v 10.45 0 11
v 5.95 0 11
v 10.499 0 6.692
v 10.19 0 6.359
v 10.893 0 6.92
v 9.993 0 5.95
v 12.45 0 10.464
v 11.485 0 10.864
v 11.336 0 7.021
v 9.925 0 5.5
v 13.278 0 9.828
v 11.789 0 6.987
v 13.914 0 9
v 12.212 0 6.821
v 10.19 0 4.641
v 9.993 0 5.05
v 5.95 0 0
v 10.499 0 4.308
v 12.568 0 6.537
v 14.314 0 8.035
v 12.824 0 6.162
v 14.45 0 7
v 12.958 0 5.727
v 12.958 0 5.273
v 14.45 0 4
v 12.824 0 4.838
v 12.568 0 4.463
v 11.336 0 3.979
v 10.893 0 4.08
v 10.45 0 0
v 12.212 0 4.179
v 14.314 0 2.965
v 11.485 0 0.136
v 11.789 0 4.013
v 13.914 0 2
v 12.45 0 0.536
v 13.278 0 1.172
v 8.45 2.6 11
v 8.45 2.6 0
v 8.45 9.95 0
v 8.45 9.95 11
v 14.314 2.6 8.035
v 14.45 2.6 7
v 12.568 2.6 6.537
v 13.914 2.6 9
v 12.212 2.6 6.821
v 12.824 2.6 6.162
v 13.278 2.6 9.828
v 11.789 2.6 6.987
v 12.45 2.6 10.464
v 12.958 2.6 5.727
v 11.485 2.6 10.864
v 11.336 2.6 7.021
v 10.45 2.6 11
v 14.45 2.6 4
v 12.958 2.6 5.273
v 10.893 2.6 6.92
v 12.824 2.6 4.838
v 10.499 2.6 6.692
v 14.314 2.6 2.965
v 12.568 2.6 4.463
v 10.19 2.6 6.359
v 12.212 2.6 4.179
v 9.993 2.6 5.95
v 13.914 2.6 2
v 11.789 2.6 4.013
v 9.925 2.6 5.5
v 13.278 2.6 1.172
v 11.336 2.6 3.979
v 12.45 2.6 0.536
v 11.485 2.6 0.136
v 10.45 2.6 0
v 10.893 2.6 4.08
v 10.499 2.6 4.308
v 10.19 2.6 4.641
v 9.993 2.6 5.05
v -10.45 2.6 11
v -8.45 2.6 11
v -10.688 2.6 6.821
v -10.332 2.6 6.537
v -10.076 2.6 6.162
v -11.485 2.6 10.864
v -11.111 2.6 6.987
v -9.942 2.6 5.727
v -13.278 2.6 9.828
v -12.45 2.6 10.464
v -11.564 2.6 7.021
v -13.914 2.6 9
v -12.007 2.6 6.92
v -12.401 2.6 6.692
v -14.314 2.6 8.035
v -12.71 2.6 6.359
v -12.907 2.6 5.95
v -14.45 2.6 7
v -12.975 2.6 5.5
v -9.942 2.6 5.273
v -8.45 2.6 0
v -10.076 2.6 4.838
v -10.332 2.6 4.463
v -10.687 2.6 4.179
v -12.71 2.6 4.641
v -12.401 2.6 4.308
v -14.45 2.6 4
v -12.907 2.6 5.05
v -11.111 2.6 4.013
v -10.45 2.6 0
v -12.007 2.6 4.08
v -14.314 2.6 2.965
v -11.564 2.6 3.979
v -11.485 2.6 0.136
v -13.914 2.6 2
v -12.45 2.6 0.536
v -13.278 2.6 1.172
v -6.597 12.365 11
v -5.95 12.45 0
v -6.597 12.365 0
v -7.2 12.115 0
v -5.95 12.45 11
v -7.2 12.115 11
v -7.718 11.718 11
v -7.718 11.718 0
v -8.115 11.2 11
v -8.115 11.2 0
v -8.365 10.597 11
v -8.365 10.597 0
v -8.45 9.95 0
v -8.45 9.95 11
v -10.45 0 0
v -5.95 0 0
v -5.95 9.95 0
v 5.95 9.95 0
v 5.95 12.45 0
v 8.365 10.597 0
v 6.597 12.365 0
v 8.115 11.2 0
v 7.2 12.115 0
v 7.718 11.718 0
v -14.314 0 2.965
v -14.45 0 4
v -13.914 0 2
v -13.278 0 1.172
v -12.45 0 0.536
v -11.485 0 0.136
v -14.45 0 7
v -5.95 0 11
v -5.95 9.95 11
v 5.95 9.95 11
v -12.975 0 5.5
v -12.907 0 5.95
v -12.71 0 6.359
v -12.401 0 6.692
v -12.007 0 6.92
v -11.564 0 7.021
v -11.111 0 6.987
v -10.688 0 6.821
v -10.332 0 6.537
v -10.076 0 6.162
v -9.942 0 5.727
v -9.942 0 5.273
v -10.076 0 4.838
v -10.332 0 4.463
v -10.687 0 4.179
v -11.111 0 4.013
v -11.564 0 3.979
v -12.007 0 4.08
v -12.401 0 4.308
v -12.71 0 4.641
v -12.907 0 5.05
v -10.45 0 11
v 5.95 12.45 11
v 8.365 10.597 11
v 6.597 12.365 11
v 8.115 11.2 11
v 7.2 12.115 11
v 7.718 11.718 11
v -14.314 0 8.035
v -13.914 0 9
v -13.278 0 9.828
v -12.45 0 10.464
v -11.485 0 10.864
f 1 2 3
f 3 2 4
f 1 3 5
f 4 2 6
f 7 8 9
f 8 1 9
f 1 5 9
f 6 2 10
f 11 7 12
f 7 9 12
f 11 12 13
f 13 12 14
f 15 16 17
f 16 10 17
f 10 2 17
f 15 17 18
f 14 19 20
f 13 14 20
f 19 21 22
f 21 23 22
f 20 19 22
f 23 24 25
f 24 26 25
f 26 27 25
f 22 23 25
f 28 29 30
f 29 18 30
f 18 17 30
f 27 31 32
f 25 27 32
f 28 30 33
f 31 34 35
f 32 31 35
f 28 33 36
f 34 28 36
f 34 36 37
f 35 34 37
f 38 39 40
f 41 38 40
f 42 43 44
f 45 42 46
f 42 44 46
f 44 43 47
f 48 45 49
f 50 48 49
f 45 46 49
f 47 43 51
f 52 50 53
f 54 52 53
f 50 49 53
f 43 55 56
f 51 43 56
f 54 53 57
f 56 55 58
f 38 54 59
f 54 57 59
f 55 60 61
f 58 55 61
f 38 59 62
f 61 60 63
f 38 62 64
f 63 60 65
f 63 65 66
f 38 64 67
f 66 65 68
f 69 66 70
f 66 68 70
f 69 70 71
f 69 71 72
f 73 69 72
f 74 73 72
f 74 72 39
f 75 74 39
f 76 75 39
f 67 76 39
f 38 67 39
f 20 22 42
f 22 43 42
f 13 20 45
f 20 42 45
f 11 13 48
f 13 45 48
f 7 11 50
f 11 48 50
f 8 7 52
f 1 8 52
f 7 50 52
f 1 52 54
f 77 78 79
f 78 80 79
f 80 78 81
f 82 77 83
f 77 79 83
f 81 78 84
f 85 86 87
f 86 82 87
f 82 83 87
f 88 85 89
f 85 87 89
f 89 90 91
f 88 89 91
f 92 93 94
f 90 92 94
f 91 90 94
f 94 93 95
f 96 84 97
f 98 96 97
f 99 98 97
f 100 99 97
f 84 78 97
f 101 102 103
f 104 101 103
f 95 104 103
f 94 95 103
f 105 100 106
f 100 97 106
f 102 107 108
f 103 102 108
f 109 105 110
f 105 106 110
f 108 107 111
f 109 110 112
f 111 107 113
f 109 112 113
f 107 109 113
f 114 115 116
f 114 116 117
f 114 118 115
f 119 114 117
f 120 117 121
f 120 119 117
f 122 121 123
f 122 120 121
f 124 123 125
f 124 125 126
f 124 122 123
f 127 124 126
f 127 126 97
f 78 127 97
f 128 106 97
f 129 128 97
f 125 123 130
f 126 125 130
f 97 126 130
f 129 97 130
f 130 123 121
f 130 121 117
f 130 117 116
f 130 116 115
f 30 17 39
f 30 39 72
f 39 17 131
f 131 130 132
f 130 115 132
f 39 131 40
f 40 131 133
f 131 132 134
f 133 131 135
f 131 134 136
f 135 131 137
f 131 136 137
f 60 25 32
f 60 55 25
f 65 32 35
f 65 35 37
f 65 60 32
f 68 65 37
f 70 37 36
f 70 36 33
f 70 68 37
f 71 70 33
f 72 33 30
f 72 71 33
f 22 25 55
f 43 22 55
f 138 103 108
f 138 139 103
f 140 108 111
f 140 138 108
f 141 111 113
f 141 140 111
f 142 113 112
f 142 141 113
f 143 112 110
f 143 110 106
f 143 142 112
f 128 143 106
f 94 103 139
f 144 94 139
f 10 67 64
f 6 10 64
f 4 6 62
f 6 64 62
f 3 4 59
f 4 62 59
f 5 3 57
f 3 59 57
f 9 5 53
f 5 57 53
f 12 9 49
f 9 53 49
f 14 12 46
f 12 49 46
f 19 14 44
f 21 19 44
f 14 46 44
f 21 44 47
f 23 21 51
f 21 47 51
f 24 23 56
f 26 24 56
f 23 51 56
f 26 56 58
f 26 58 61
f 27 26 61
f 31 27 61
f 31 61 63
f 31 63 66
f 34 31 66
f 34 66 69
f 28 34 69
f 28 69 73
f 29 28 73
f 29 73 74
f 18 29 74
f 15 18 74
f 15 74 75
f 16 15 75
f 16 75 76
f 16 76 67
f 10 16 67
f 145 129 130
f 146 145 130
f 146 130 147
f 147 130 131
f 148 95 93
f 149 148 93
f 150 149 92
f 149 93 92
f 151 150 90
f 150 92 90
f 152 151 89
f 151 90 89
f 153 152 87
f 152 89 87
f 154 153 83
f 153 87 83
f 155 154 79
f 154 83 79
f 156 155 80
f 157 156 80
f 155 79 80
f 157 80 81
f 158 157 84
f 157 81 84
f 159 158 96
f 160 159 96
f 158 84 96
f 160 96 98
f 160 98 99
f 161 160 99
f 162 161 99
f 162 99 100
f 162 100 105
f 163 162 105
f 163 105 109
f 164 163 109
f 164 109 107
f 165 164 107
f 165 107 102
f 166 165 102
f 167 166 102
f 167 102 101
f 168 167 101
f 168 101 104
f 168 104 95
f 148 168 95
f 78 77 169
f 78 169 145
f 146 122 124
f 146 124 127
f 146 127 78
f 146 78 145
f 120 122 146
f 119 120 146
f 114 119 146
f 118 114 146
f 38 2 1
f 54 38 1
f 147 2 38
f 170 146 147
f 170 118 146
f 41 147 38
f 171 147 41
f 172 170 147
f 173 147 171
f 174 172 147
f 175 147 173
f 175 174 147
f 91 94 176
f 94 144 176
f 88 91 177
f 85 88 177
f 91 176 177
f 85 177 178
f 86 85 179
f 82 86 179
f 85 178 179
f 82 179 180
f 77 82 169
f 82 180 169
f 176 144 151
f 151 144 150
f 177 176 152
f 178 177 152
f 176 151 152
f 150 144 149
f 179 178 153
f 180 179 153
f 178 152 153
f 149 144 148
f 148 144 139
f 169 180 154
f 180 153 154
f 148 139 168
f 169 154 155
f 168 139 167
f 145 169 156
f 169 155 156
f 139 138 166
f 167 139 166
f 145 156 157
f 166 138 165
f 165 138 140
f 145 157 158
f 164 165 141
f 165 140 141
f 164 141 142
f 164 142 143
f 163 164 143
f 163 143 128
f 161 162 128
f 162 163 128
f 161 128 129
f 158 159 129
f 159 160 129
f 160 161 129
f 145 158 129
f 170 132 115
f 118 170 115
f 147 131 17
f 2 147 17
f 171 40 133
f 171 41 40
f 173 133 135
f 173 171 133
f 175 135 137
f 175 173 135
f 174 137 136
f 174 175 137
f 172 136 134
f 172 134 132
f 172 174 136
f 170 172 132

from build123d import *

# Parameters (mm, degrees)
BOSS_EXTRUDE1_DEPTH = 11
FILLET1_R           = 4
FILLET2_R           = 2.5
SKETCH2_R           = 1.525
CUT_EXTRUDE1_DEPTH  = 11


with BuildPart() as part:
    # Sketch1 → Boss-Extrude1 (new body)
    with BuildSketch(Plane.XY):
        Polygon((-5.95, 0), (-5.95, 9.95), (5.95, 9.95), (5.95, 0), (8.65875, 0), (14.45, 0), (14.45, 2.6), (8.45, 2.6), (8.45, 12.45), (-8.45, 12.45), (-8.45, 2.6), (-14.45, 2.6), (-14.45, 0), (-8.65875, 0), align=None)
    extrude(amount=BOSS_EXTRUDE1_DEPTH)

    # Fillet1
    fillet1_edges = [part.edges().sort_by_distance(p)[0] for p in [
        (-14.45, 1.3, 0),
        (14.45, 1.3, 0),
        (14.45, 1.3, 11),
        (-14.45, 1.3, 11),
    ]]
    fillet(fillet1_edges, radius=FILLET1_R)

    # Fillet2
    fillet2_edges = [part.edges().sort_by_distance(p)[0] for p in [
        (-8.45, 12.45, 5.5),
        (8.45, 12.45, 5.5),
    ]]
    fillet(fillet2_edges, radius=FILLET2_R)

    # Sketch2 → Cut-Extrude1 (cut)
    with BuildSketch(Plane(origin=(0, 2.6, 0), x_dir=(1, 0, 0), z_dir=(0, 1, 0))):
        with Locations(Location((-11.45, -5.5, 0), (0, 0, 180))):
            Circle(SKETCH2_R)
        with Locations(Location((11.45, -5.5, 0), (0, 0, 180))):
            Circle(SKETCH2_R)
    extrude(amount=-CUT_EXTRUDE1_DEPTH, mode=Mode.SUBTRACT)


solid = part.part
